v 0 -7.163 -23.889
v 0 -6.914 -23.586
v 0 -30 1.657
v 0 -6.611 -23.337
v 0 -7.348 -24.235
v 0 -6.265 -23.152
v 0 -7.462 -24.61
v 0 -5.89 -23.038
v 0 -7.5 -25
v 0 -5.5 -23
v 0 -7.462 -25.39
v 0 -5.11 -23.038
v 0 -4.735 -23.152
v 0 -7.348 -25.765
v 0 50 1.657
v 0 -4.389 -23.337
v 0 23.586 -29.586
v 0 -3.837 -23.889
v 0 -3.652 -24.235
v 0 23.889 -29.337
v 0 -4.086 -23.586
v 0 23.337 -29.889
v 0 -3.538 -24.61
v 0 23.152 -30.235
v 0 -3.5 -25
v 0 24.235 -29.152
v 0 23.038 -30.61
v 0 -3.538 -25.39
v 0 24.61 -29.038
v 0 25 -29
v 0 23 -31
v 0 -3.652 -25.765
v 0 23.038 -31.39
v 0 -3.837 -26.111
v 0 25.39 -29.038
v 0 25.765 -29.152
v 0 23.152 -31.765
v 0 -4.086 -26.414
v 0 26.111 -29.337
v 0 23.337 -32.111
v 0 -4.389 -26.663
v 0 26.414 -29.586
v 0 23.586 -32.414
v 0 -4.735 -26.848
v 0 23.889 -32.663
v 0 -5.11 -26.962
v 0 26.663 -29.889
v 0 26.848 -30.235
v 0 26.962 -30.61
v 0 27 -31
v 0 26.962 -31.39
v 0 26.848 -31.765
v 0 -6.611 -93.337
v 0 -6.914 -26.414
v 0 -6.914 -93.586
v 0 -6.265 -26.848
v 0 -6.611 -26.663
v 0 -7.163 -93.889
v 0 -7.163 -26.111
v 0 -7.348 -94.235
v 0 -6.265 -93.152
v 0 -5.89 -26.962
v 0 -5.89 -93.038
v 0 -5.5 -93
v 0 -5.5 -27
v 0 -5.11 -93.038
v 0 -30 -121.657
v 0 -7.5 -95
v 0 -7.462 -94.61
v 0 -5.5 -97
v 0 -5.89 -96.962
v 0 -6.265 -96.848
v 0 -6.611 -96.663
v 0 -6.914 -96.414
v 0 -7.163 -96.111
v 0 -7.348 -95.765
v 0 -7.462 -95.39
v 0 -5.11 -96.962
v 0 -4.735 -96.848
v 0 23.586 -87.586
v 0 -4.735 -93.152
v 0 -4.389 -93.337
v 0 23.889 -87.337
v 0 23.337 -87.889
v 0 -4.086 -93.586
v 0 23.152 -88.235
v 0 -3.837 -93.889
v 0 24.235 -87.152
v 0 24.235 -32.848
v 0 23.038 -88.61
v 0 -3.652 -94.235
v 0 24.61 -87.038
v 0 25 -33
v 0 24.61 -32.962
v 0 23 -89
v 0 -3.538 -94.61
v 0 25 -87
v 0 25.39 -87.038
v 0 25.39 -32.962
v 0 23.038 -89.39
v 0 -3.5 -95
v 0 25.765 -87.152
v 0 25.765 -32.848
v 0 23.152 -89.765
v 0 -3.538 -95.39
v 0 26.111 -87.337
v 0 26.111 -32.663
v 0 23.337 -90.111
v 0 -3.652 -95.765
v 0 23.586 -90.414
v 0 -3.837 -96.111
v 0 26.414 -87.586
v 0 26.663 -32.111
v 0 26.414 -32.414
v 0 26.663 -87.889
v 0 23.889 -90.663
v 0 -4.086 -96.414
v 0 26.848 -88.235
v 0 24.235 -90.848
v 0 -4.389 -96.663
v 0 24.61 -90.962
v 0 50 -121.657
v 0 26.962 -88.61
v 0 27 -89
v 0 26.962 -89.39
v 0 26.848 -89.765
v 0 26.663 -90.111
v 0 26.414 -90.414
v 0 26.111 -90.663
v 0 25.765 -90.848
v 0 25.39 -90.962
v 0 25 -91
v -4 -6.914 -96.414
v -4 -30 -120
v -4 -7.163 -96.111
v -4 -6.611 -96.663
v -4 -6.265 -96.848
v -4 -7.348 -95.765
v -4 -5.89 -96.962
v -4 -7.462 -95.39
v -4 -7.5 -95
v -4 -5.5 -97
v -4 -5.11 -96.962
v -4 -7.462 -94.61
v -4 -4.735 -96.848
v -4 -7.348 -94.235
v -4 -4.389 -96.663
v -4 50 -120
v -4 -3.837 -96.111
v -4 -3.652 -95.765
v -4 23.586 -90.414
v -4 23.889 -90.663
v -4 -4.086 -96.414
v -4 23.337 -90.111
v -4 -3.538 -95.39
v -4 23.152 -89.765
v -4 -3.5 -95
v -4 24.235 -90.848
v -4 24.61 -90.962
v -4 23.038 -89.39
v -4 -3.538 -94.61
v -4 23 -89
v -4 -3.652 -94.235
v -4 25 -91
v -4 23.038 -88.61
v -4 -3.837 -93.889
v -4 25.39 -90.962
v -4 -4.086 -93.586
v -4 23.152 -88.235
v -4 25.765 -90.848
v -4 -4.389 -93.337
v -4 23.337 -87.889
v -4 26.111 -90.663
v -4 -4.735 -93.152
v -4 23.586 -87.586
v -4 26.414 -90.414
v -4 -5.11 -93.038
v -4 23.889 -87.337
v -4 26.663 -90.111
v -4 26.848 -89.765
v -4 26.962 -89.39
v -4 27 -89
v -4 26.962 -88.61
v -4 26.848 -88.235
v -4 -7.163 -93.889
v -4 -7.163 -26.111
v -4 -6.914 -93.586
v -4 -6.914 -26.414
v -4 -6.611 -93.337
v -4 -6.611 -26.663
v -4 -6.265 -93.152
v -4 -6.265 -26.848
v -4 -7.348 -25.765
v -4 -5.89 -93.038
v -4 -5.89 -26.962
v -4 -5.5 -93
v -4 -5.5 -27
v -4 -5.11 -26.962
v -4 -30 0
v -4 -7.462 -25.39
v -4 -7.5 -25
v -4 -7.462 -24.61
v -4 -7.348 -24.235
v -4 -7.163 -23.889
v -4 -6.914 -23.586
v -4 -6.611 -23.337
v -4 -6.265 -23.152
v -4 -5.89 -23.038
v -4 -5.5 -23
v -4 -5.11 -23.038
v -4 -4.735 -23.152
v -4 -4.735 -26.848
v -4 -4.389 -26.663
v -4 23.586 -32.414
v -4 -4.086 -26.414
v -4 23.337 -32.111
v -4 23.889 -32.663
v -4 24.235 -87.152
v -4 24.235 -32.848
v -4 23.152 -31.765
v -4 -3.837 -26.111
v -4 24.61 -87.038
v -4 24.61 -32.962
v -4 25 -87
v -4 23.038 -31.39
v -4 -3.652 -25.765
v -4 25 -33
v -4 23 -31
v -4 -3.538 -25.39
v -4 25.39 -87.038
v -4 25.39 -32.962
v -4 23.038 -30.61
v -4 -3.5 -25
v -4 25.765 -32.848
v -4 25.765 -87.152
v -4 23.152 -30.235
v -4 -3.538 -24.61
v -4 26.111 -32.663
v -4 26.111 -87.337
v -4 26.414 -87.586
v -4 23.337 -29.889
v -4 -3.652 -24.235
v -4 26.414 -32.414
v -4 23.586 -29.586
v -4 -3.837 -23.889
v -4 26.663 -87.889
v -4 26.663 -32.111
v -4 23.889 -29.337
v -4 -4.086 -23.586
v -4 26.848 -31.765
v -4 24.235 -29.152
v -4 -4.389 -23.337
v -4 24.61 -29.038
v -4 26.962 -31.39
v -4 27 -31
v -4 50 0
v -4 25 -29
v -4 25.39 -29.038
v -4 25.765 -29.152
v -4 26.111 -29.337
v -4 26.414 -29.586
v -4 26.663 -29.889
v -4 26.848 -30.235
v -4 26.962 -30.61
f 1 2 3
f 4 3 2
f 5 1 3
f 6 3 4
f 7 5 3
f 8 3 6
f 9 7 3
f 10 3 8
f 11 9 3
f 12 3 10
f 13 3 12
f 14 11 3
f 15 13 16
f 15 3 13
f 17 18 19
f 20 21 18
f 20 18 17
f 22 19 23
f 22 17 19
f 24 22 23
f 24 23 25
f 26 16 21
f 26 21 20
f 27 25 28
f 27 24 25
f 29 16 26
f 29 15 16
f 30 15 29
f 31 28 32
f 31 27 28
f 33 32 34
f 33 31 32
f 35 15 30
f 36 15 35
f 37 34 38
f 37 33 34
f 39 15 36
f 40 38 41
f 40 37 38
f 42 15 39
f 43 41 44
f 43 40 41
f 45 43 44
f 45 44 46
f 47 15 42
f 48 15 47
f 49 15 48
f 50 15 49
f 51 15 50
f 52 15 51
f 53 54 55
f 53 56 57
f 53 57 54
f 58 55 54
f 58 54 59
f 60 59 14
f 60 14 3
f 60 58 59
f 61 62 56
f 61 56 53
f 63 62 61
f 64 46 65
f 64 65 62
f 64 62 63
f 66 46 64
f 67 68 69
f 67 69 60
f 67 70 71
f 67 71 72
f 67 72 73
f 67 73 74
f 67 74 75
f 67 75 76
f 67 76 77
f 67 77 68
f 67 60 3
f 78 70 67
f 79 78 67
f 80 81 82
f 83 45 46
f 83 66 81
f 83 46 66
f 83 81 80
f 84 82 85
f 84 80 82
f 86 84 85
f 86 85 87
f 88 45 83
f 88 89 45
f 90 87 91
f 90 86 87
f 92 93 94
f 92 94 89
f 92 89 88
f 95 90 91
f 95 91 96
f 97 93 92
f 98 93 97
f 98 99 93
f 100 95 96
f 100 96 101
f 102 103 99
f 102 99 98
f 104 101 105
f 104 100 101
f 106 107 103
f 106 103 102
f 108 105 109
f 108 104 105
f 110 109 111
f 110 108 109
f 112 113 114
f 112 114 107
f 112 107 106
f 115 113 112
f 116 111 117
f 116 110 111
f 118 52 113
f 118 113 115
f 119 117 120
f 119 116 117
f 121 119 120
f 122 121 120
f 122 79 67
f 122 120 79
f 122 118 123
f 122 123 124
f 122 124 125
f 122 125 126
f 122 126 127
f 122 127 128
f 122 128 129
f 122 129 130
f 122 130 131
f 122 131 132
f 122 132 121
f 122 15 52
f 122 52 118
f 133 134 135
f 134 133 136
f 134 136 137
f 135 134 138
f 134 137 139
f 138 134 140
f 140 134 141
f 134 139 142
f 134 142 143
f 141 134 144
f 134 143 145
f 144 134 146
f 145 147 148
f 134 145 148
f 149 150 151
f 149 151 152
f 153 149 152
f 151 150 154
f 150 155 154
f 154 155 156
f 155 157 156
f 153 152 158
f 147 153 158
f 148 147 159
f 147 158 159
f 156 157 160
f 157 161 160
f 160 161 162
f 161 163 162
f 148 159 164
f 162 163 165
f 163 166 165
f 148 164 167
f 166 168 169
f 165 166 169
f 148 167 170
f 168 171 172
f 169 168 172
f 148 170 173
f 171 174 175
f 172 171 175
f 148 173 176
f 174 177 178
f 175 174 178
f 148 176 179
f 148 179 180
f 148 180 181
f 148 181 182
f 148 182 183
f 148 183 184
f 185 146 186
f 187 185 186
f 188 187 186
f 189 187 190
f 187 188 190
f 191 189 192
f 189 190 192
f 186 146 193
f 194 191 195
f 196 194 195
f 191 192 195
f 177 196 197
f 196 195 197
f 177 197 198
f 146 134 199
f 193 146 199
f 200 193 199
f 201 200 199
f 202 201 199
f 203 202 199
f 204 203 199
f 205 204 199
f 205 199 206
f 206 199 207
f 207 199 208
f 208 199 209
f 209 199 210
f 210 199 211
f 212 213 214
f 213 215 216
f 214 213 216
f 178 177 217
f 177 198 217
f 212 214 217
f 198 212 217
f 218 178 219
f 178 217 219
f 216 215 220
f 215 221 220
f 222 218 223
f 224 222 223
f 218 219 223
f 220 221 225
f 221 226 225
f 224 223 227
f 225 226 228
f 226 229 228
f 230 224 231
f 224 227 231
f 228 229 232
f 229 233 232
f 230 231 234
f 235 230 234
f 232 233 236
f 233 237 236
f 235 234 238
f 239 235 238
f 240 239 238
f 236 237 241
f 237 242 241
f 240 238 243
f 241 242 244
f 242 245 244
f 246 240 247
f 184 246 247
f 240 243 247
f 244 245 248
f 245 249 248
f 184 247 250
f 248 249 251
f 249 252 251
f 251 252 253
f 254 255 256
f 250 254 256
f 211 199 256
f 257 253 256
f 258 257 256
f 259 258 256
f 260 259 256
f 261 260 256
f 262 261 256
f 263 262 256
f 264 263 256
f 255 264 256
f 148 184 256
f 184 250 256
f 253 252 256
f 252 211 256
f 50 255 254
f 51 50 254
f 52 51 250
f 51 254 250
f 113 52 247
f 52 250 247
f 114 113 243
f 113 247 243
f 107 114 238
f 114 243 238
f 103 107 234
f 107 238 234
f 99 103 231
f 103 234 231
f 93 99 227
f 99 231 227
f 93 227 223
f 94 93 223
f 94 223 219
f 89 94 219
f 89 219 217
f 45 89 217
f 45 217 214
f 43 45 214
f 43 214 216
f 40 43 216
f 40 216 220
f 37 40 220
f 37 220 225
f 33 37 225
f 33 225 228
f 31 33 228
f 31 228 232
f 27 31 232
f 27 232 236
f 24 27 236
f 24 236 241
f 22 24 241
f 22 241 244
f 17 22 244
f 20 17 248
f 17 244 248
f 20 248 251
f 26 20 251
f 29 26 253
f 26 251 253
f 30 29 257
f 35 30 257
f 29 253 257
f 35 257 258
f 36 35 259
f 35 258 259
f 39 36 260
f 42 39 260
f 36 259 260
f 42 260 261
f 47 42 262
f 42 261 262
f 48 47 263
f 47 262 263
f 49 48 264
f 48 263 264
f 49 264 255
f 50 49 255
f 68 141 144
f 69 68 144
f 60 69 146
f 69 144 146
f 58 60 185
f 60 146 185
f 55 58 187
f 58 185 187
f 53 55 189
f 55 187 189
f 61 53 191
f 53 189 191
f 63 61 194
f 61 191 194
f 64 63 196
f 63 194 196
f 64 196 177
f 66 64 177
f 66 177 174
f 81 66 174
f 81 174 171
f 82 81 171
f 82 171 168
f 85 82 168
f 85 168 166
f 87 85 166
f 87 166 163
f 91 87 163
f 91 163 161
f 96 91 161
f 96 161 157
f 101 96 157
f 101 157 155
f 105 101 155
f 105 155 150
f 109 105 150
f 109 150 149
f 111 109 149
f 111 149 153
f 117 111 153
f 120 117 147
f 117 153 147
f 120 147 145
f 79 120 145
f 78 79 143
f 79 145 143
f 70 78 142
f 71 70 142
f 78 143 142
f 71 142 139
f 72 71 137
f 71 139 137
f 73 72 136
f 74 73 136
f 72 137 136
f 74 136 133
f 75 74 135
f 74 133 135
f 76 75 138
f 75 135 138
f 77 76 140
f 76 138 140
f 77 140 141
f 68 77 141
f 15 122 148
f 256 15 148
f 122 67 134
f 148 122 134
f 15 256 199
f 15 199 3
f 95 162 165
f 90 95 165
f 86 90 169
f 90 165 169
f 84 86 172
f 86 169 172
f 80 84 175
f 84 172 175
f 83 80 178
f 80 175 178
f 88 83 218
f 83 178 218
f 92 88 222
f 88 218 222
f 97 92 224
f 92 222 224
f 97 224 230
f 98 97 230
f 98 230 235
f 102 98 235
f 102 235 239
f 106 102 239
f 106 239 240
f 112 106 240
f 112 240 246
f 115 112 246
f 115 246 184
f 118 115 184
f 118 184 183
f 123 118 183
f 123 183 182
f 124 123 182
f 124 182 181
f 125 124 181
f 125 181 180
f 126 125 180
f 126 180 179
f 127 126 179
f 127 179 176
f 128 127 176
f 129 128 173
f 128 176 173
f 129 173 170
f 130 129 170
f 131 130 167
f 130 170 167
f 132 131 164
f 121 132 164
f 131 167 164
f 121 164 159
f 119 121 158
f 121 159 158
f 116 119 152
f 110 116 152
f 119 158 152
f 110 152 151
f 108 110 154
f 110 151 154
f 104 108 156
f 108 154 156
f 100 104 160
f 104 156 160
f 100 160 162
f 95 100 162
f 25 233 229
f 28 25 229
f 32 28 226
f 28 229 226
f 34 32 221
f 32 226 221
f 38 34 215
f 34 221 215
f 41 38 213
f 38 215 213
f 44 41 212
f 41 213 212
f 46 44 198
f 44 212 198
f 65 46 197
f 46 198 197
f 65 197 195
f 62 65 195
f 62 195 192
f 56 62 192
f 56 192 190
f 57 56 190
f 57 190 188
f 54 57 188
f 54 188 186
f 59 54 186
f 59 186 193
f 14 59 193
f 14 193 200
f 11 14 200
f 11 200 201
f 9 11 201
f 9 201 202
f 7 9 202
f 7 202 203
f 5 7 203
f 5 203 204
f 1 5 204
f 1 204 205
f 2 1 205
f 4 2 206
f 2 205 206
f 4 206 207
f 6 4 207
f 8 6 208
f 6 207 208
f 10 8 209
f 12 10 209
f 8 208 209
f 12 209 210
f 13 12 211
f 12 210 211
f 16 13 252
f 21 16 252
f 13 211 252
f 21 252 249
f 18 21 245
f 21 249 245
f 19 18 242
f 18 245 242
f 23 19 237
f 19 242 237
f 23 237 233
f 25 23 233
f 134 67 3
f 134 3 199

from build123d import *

# Parameters (mm, degrees)
SKETCH_1_W          = 4
SKETCH_1_H          = 80
EXTRUDE_3_DEPTH     = 120
SKETCH_3_R          = 2
CUT_EXTRUDE_1_DEPTH = 131.061523903
EXTRUDE_4_DEPTH     = 80


with BuildPart() as part:
    # 草图1 → 拉伸3 (new body)
    with BuildSketch(Plane.XY):
        with Locations((-2, 10)):
            Rectangle(SKETCH_1_W, SKETCH_1_H)
    extrude(amount=-EXTRUDE_3_DEPTH)

    # 草图3 → 切除-拉伸1 (cut, through all)
    with BuildSketch(Plane.ZY.offset(4)):
        with Locations(Location((-89, 25, 0), (0, 0, 270))):
            Circle(SKETCH_3_R)
        with Locations(Location((-95, -5.5, 0), (0, 0, 270))):
            Circle(SKETCH_3_R)
        with Locations(Location((-25, -5.5, 0), (0, 0, 90))):
            Circle(SKETCH_3_R)
        with Locations(Location((-31, 25, 0), (0, 0, 90))):
            Circle(SKETCH_3_R)
    extrude(amount=-CUT_EXTRUDE_1_DEPTH, mode=Mode.SUBTRACT)

    # 草图4 → 拉伸4 (add)
    with BuildSketch(Plane(origin=(0, 50, 0), x_dir=(-1, 0, 0), z_dir=(0, 1, 0))):
        Polygon((4, 0), (0, 1.656854249), (0, 0), align=None)
        Polygon((4, -120), (0, -120), (0, -121.656854249), align=None)
    extrude(amount=-EXTRUDE_4_DEPTH)


solid = part.part
